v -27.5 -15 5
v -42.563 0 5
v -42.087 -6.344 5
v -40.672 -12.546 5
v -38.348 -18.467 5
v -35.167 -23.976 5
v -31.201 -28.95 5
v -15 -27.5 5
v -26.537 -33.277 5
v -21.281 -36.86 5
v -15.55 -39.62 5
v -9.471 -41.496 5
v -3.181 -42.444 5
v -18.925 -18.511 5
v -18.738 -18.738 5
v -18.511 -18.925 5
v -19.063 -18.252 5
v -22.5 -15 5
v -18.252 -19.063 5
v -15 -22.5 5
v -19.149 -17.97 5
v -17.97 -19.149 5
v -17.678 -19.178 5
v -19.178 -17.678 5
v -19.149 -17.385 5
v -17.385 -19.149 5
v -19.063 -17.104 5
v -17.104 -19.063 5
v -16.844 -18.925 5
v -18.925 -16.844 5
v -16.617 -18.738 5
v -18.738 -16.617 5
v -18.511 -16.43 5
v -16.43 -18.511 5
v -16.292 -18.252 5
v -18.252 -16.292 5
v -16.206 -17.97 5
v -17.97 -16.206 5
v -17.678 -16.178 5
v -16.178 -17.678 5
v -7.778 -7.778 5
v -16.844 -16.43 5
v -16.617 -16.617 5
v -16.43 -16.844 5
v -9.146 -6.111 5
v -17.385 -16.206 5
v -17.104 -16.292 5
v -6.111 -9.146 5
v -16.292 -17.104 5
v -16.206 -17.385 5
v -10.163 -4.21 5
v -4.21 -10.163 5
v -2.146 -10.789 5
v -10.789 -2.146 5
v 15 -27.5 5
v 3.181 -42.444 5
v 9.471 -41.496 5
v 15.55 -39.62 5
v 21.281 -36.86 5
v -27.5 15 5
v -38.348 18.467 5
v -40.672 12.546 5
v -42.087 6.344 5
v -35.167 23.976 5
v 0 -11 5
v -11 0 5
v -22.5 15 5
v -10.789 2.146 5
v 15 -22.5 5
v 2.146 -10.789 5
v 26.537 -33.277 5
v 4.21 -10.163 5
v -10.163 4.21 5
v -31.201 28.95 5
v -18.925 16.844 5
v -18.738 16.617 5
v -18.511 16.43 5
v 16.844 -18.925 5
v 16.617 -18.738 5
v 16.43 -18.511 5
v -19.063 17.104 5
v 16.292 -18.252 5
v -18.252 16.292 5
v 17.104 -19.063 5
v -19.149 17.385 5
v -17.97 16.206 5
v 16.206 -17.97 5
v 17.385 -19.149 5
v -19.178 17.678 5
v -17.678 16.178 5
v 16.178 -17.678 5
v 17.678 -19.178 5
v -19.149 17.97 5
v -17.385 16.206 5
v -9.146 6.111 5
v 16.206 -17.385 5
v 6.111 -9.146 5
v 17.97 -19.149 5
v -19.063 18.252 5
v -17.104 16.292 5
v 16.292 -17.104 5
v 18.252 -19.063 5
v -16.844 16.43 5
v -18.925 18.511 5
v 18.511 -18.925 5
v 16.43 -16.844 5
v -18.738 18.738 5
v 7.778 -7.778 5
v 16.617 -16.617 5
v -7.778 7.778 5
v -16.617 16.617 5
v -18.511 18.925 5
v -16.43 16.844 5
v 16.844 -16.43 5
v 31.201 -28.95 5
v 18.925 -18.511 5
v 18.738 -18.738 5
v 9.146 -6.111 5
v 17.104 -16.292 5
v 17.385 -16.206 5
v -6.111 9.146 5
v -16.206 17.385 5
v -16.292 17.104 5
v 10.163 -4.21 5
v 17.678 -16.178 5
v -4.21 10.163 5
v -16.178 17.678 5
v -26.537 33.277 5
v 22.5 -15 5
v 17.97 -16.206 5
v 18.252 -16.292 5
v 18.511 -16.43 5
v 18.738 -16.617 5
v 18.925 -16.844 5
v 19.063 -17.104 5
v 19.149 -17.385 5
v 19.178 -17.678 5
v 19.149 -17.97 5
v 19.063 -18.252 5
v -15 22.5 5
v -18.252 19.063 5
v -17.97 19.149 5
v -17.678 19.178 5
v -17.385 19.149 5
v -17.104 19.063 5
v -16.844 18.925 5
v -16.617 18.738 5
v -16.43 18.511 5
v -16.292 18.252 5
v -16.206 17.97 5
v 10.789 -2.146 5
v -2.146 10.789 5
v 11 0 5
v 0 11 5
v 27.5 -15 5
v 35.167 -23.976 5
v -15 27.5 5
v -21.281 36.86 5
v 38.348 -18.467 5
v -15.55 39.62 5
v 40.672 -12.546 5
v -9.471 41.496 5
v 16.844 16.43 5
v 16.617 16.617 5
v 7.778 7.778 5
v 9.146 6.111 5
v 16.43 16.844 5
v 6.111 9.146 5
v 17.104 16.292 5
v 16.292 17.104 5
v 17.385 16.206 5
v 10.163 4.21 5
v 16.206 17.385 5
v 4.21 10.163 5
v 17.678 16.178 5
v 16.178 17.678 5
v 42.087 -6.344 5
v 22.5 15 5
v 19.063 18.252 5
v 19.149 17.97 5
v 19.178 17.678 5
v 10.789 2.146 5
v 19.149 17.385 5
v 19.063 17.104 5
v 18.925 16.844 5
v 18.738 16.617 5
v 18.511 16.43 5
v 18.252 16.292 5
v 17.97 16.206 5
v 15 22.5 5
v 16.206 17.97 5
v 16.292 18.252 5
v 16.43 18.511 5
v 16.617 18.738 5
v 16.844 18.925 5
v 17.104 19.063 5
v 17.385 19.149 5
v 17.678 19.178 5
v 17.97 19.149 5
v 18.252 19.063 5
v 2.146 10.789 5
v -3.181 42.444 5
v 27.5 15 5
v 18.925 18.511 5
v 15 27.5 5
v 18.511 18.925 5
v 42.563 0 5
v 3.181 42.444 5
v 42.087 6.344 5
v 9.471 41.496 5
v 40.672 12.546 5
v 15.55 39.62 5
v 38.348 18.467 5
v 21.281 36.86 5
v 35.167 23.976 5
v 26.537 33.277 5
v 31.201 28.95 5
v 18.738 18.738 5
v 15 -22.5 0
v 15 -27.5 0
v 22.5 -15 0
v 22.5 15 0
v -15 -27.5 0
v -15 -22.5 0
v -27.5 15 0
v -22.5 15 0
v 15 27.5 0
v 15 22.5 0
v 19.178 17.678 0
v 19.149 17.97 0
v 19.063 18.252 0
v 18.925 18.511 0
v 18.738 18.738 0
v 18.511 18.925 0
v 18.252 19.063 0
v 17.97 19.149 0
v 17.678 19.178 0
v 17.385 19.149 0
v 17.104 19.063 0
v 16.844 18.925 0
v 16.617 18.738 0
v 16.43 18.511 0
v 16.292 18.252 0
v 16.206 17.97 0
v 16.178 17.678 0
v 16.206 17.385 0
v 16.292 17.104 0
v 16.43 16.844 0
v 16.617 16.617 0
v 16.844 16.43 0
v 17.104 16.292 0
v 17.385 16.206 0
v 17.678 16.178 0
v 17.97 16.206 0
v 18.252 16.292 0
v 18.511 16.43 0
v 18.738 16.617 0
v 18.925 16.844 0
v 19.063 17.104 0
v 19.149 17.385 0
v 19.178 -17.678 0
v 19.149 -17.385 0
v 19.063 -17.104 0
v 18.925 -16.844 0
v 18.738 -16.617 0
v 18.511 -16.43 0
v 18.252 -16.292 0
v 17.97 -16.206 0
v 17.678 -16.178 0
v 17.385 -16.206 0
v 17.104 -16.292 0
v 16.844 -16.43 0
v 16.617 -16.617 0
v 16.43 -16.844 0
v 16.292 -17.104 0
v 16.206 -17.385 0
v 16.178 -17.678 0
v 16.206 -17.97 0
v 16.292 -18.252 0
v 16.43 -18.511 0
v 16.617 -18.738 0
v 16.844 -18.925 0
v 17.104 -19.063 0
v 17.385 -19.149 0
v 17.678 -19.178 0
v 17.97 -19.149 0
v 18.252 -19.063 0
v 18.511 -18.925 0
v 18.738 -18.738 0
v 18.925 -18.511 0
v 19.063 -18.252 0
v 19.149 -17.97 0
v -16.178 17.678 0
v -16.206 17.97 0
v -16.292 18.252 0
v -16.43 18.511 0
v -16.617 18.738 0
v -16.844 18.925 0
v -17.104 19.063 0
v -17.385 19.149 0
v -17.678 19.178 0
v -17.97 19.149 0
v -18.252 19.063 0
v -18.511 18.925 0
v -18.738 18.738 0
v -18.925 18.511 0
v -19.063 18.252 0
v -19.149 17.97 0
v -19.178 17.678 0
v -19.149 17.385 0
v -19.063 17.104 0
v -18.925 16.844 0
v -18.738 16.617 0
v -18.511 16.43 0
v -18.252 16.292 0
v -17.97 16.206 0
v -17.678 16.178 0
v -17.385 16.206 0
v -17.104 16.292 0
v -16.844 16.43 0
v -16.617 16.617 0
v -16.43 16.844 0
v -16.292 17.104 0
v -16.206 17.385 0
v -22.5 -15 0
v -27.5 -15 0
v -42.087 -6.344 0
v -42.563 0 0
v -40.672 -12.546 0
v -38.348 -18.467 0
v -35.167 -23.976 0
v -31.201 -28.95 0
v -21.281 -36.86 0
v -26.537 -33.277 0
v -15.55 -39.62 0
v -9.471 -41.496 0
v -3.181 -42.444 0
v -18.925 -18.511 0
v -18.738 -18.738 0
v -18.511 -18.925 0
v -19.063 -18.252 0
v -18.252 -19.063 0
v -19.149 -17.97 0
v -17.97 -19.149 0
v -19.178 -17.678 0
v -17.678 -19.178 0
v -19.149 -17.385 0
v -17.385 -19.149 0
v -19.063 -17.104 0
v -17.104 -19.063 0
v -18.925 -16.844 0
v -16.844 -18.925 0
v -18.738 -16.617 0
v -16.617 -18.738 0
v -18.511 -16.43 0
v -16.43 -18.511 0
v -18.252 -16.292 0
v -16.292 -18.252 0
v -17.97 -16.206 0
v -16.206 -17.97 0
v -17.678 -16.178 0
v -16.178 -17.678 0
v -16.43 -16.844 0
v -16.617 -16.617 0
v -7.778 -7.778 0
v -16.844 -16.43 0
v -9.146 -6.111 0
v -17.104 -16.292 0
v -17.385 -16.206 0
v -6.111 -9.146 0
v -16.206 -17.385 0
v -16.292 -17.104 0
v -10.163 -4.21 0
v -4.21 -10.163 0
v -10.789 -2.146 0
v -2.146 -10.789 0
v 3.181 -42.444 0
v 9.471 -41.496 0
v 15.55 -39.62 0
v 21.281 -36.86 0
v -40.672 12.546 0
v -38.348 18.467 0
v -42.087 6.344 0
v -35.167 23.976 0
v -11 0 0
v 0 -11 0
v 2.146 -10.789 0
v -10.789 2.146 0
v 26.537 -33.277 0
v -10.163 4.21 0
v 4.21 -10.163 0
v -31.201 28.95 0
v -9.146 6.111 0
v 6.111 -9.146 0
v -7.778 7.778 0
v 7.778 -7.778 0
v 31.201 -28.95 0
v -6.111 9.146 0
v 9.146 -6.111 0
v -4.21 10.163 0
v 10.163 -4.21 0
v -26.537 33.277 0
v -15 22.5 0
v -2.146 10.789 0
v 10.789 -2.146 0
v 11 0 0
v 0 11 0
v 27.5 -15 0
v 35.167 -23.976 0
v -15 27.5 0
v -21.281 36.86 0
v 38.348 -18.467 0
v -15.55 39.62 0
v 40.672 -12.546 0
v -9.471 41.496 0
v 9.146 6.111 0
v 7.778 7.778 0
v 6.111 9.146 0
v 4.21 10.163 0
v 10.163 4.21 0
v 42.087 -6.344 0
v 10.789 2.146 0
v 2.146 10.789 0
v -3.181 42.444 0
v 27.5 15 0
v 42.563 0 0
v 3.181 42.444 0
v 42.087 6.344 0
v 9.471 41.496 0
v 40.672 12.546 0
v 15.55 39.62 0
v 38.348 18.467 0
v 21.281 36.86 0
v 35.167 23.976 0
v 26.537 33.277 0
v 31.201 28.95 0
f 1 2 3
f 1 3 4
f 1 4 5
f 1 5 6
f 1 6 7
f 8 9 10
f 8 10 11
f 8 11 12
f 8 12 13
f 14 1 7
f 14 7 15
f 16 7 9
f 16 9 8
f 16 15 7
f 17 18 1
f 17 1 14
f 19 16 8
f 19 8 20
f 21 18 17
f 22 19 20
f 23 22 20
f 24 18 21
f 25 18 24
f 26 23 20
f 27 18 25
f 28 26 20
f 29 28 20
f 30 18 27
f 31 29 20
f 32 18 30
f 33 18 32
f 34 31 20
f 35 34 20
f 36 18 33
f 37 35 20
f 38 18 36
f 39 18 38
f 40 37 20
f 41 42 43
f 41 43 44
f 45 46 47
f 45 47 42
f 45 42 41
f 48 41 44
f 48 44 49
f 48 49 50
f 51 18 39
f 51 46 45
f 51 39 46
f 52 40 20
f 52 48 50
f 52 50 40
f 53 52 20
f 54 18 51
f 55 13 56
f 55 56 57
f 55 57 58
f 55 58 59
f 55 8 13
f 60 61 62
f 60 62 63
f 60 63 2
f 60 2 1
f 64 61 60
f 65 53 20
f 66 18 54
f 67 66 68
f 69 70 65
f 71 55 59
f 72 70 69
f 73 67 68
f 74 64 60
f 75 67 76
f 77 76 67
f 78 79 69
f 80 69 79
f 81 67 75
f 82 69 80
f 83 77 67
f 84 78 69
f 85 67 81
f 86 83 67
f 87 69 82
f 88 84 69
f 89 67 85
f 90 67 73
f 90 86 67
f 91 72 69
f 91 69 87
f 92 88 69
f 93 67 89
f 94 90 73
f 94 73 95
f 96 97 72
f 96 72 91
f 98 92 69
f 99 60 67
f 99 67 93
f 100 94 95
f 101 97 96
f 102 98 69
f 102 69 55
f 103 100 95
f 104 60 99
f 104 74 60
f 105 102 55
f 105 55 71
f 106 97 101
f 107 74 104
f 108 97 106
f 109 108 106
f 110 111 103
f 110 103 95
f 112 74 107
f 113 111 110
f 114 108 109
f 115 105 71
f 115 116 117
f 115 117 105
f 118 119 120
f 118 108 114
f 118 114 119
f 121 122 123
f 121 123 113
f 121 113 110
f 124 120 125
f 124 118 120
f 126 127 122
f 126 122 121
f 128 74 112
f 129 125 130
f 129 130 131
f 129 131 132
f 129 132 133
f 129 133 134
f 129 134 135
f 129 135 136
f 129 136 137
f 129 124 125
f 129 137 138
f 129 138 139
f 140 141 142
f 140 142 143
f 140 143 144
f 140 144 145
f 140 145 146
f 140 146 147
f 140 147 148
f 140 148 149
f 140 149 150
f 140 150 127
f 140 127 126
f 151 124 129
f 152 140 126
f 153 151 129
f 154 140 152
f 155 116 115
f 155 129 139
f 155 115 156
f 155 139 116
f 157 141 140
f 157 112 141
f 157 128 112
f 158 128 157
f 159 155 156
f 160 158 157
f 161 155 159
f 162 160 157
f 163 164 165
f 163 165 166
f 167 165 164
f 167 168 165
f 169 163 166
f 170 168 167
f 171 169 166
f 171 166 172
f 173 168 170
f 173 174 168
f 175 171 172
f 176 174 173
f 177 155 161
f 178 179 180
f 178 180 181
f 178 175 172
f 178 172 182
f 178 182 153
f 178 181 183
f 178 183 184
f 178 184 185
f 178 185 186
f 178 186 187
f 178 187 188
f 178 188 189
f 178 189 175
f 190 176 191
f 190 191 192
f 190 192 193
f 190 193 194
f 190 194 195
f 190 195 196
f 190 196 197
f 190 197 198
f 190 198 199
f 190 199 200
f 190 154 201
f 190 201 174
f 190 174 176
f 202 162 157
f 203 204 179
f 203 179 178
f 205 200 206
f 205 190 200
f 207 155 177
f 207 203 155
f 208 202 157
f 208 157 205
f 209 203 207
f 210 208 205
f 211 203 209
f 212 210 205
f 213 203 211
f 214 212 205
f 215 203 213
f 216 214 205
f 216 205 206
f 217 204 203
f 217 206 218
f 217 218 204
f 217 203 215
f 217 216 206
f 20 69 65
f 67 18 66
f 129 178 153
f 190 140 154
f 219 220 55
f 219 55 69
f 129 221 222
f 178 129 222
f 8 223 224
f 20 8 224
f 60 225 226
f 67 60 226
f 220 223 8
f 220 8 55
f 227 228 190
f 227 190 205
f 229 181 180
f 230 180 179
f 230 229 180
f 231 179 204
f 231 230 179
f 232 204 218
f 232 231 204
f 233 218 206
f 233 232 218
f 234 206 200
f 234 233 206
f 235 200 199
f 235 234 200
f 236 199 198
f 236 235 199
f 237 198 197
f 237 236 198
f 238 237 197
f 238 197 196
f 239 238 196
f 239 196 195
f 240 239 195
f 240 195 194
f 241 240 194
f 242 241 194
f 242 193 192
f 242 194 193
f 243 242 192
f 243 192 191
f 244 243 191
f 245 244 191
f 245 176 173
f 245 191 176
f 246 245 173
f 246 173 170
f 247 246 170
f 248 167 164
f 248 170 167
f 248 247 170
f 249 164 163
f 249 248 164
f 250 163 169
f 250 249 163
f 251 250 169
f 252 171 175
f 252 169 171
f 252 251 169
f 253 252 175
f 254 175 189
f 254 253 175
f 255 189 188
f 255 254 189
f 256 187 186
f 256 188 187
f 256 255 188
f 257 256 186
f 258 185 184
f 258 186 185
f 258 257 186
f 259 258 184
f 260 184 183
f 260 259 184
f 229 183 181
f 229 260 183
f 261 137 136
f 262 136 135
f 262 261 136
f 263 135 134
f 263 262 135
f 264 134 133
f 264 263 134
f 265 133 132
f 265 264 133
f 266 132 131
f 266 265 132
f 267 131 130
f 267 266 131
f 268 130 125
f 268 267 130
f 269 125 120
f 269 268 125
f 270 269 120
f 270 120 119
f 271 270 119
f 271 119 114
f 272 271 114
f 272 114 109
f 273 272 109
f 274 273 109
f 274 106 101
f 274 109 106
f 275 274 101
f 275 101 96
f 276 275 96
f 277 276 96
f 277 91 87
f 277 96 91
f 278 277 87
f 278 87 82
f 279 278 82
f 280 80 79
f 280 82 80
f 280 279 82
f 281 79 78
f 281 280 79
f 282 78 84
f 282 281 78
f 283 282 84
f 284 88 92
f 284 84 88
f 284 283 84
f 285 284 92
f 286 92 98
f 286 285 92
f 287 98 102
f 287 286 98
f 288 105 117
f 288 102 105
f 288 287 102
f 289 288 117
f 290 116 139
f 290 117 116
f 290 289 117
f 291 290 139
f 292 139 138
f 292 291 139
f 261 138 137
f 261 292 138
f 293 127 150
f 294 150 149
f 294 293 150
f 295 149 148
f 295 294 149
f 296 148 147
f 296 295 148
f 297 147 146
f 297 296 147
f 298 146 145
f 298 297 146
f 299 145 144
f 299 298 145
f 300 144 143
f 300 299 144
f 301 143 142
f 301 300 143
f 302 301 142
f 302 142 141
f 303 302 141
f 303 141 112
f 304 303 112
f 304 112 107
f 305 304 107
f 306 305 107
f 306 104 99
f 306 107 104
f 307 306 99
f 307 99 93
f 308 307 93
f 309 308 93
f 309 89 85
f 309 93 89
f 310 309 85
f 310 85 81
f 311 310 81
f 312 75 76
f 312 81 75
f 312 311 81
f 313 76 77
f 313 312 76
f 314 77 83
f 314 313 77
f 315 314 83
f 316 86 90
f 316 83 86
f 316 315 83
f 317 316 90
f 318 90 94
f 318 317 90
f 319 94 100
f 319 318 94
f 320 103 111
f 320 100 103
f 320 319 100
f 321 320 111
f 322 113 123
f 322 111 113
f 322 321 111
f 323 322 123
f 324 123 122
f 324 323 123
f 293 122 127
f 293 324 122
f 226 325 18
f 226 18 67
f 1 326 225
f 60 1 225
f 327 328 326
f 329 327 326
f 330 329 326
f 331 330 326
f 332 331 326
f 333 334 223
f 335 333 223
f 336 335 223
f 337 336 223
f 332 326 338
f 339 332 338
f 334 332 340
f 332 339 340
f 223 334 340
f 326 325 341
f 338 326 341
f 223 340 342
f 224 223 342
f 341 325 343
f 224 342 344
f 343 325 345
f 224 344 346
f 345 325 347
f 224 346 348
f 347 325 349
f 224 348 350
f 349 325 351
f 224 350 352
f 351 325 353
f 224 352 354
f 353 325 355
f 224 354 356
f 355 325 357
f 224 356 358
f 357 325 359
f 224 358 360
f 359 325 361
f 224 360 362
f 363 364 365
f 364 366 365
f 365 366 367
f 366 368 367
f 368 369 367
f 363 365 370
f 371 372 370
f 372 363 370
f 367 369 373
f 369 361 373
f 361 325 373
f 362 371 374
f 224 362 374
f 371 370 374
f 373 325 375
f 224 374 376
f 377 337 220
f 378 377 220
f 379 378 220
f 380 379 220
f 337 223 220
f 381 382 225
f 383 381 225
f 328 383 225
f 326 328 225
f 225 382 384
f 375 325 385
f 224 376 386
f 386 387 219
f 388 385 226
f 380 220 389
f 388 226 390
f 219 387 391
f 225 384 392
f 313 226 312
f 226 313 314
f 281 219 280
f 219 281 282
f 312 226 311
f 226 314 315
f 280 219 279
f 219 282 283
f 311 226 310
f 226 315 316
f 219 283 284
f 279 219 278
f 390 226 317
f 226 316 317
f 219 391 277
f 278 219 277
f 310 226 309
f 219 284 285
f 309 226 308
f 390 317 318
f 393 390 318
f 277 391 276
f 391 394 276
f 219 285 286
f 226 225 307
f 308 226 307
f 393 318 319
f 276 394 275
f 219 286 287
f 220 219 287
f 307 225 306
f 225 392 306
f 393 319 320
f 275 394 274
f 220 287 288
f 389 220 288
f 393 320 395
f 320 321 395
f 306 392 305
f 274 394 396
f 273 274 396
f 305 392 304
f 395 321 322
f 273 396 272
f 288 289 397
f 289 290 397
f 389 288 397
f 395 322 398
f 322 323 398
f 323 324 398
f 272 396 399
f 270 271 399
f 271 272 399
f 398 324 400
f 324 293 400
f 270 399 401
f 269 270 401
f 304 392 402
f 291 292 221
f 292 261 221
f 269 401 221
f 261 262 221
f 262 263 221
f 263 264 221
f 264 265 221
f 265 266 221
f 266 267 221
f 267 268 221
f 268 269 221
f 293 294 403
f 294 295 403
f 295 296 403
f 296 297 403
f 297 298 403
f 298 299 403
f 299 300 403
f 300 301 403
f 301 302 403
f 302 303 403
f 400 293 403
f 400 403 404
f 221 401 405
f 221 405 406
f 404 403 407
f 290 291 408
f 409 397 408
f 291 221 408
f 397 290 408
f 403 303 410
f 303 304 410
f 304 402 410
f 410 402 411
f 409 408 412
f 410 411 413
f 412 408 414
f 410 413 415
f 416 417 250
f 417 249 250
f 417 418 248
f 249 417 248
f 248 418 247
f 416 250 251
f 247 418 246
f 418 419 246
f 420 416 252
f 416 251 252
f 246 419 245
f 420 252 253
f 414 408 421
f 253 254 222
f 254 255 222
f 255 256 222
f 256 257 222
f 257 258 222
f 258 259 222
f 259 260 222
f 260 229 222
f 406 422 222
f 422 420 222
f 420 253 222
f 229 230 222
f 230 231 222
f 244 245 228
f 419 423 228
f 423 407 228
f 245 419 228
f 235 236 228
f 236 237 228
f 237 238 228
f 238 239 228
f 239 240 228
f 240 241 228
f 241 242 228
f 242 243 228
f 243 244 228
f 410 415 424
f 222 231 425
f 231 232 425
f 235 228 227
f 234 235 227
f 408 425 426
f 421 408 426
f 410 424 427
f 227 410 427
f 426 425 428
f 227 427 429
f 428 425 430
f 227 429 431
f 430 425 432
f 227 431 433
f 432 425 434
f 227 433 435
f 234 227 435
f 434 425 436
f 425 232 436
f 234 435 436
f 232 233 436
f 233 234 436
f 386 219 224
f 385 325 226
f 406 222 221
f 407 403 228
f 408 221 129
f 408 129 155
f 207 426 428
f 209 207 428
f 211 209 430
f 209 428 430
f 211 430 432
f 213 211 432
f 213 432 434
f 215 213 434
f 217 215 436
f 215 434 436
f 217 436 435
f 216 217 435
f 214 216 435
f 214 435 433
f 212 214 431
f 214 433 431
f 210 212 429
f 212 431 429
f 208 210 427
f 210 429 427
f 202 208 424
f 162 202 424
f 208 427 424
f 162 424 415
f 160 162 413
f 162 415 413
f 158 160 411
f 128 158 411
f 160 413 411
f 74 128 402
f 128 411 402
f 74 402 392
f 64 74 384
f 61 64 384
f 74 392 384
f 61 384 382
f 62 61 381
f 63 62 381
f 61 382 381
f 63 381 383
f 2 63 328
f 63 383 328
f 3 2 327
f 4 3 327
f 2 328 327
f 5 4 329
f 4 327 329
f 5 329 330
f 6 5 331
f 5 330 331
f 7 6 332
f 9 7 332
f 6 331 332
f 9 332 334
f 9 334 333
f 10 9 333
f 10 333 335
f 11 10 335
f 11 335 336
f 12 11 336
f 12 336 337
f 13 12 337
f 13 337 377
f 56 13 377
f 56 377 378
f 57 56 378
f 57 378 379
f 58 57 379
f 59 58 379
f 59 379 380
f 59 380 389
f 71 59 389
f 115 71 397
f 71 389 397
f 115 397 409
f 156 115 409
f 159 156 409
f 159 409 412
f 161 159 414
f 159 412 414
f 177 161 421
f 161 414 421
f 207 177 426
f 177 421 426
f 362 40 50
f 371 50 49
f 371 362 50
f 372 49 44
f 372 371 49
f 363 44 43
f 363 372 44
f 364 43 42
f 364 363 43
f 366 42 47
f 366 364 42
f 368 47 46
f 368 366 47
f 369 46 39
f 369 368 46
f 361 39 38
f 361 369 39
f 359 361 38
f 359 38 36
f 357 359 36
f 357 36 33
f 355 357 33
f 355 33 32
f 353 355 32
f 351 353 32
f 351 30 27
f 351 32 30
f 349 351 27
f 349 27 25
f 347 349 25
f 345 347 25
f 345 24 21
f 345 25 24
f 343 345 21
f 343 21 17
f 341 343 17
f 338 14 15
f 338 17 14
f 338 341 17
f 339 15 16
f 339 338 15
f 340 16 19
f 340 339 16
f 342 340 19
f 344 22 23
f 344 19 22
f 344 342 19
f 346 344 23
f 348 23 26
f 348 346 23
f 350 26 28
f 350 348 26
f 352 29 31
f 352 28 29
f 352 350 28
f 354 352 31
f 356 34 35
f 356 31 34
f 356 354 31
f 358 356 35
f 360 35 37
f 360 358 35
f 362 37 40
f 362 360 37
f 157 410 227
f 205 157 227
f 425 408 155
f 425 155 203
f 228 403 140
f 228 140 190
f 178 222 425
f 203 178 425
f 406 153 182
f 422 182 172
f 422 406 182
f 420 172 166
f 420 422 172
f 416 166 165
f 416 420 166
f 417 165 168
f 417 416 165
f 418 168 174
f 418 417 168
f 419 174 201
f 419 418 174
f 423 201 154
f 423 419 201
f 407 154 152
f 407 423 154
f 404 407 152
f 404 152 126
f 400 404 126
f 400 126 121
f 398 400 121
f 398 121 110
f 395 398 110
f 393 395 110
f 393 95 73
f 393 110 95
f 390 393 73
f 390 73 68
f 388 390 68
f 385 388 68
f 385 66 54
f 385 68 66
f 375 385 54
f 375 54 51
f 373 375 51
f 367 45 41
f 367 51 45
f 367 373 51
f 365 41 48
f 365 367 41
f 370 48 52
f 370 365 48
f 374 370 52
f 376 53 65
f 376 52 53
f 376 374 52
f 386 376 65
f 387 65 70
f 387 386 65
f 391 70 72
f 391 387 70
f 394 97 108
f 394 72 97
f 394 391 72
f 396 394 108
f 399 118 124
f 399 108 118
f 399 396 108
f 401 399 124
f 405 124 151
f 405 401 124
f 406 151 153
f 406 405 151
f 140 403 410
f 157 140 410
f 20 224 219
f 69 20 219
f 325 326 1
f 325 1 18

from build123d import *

# Parameters (mm, degrees)
SCHIZZO1_R                   = 42.562660939
ESTRUSIONE_ESTRUSIONE1_DEPTH = 5
SCHIZZO3_R                   = 11
TAGLIO_ESTRUSIONE2_DEPTH     = 6
SCHIZZO4_R                   = 1.5
SCHIZZO4_W                   = 5
SCHIZZO4_H                   = 30
SCHIZZO4_W_2                 = 30
SCHIZZO4_H_2                 = 5
TAGLIO_ESTRUSIONE3_DEPTH     = 6


with BuildPart() as part:
    # Schizzo1 → Estrusione-Estrusione1 (new body)
    with BuildSketch(Plane.XY):
        Circle(SCHIZZO1_R)
    extrude(amount=ESTRUSIONE_ESTRUSIONE1_DEPTH)

    # Schizzo3 → Taglio-Estrusione2 (cut, through all)
    with BuildSketch(Plane.XY):
        Circle(SCHIZZO3_R)
    extrude(amount=TAGLIO_ESTRUSIONE2_DEPTH, mode=Mode.SUBTRACT)

    # Schizzo4 → Taglio-Estrusione3 (cut, through all)
    with BuildSketch(Plane.XY):
        with Locations((17.67766953, 17.67766953)):
            Circle(SCHIZZO4_R)
        with Locations((17.67766953, -17.67766953)):
            Circle(SCHIZZO4_R)
        with Locations((-17.67766953, -17.67766953)):
            Circle(SCHIZZO4_R)
        with Locations((-17.67766953, 17.67766953)):
            Circle(SCHIZZO4_R)
        with Locations((-25, 0)):
            Rectangle(SCHIZZO4_W, SCHIZZO4_H)
        with Locations((0, 25)):
            Rectangle(SCHIZZO4_W_2, SCHIZZO4_H_2)
        with Locations((25, 0)):
            Rectangle(SCHIZZO4_W, SCHIZZO4_H)
        with Locations((0, -25)):
            Rectangle(SCHIZZO4_W_2, SCHIZZO4_H_2)
    extrude(amount=TAGLIO_ESTRUSIONE3_DEPTH, mode=Mode.SUBTRACT)


solid = part.part
